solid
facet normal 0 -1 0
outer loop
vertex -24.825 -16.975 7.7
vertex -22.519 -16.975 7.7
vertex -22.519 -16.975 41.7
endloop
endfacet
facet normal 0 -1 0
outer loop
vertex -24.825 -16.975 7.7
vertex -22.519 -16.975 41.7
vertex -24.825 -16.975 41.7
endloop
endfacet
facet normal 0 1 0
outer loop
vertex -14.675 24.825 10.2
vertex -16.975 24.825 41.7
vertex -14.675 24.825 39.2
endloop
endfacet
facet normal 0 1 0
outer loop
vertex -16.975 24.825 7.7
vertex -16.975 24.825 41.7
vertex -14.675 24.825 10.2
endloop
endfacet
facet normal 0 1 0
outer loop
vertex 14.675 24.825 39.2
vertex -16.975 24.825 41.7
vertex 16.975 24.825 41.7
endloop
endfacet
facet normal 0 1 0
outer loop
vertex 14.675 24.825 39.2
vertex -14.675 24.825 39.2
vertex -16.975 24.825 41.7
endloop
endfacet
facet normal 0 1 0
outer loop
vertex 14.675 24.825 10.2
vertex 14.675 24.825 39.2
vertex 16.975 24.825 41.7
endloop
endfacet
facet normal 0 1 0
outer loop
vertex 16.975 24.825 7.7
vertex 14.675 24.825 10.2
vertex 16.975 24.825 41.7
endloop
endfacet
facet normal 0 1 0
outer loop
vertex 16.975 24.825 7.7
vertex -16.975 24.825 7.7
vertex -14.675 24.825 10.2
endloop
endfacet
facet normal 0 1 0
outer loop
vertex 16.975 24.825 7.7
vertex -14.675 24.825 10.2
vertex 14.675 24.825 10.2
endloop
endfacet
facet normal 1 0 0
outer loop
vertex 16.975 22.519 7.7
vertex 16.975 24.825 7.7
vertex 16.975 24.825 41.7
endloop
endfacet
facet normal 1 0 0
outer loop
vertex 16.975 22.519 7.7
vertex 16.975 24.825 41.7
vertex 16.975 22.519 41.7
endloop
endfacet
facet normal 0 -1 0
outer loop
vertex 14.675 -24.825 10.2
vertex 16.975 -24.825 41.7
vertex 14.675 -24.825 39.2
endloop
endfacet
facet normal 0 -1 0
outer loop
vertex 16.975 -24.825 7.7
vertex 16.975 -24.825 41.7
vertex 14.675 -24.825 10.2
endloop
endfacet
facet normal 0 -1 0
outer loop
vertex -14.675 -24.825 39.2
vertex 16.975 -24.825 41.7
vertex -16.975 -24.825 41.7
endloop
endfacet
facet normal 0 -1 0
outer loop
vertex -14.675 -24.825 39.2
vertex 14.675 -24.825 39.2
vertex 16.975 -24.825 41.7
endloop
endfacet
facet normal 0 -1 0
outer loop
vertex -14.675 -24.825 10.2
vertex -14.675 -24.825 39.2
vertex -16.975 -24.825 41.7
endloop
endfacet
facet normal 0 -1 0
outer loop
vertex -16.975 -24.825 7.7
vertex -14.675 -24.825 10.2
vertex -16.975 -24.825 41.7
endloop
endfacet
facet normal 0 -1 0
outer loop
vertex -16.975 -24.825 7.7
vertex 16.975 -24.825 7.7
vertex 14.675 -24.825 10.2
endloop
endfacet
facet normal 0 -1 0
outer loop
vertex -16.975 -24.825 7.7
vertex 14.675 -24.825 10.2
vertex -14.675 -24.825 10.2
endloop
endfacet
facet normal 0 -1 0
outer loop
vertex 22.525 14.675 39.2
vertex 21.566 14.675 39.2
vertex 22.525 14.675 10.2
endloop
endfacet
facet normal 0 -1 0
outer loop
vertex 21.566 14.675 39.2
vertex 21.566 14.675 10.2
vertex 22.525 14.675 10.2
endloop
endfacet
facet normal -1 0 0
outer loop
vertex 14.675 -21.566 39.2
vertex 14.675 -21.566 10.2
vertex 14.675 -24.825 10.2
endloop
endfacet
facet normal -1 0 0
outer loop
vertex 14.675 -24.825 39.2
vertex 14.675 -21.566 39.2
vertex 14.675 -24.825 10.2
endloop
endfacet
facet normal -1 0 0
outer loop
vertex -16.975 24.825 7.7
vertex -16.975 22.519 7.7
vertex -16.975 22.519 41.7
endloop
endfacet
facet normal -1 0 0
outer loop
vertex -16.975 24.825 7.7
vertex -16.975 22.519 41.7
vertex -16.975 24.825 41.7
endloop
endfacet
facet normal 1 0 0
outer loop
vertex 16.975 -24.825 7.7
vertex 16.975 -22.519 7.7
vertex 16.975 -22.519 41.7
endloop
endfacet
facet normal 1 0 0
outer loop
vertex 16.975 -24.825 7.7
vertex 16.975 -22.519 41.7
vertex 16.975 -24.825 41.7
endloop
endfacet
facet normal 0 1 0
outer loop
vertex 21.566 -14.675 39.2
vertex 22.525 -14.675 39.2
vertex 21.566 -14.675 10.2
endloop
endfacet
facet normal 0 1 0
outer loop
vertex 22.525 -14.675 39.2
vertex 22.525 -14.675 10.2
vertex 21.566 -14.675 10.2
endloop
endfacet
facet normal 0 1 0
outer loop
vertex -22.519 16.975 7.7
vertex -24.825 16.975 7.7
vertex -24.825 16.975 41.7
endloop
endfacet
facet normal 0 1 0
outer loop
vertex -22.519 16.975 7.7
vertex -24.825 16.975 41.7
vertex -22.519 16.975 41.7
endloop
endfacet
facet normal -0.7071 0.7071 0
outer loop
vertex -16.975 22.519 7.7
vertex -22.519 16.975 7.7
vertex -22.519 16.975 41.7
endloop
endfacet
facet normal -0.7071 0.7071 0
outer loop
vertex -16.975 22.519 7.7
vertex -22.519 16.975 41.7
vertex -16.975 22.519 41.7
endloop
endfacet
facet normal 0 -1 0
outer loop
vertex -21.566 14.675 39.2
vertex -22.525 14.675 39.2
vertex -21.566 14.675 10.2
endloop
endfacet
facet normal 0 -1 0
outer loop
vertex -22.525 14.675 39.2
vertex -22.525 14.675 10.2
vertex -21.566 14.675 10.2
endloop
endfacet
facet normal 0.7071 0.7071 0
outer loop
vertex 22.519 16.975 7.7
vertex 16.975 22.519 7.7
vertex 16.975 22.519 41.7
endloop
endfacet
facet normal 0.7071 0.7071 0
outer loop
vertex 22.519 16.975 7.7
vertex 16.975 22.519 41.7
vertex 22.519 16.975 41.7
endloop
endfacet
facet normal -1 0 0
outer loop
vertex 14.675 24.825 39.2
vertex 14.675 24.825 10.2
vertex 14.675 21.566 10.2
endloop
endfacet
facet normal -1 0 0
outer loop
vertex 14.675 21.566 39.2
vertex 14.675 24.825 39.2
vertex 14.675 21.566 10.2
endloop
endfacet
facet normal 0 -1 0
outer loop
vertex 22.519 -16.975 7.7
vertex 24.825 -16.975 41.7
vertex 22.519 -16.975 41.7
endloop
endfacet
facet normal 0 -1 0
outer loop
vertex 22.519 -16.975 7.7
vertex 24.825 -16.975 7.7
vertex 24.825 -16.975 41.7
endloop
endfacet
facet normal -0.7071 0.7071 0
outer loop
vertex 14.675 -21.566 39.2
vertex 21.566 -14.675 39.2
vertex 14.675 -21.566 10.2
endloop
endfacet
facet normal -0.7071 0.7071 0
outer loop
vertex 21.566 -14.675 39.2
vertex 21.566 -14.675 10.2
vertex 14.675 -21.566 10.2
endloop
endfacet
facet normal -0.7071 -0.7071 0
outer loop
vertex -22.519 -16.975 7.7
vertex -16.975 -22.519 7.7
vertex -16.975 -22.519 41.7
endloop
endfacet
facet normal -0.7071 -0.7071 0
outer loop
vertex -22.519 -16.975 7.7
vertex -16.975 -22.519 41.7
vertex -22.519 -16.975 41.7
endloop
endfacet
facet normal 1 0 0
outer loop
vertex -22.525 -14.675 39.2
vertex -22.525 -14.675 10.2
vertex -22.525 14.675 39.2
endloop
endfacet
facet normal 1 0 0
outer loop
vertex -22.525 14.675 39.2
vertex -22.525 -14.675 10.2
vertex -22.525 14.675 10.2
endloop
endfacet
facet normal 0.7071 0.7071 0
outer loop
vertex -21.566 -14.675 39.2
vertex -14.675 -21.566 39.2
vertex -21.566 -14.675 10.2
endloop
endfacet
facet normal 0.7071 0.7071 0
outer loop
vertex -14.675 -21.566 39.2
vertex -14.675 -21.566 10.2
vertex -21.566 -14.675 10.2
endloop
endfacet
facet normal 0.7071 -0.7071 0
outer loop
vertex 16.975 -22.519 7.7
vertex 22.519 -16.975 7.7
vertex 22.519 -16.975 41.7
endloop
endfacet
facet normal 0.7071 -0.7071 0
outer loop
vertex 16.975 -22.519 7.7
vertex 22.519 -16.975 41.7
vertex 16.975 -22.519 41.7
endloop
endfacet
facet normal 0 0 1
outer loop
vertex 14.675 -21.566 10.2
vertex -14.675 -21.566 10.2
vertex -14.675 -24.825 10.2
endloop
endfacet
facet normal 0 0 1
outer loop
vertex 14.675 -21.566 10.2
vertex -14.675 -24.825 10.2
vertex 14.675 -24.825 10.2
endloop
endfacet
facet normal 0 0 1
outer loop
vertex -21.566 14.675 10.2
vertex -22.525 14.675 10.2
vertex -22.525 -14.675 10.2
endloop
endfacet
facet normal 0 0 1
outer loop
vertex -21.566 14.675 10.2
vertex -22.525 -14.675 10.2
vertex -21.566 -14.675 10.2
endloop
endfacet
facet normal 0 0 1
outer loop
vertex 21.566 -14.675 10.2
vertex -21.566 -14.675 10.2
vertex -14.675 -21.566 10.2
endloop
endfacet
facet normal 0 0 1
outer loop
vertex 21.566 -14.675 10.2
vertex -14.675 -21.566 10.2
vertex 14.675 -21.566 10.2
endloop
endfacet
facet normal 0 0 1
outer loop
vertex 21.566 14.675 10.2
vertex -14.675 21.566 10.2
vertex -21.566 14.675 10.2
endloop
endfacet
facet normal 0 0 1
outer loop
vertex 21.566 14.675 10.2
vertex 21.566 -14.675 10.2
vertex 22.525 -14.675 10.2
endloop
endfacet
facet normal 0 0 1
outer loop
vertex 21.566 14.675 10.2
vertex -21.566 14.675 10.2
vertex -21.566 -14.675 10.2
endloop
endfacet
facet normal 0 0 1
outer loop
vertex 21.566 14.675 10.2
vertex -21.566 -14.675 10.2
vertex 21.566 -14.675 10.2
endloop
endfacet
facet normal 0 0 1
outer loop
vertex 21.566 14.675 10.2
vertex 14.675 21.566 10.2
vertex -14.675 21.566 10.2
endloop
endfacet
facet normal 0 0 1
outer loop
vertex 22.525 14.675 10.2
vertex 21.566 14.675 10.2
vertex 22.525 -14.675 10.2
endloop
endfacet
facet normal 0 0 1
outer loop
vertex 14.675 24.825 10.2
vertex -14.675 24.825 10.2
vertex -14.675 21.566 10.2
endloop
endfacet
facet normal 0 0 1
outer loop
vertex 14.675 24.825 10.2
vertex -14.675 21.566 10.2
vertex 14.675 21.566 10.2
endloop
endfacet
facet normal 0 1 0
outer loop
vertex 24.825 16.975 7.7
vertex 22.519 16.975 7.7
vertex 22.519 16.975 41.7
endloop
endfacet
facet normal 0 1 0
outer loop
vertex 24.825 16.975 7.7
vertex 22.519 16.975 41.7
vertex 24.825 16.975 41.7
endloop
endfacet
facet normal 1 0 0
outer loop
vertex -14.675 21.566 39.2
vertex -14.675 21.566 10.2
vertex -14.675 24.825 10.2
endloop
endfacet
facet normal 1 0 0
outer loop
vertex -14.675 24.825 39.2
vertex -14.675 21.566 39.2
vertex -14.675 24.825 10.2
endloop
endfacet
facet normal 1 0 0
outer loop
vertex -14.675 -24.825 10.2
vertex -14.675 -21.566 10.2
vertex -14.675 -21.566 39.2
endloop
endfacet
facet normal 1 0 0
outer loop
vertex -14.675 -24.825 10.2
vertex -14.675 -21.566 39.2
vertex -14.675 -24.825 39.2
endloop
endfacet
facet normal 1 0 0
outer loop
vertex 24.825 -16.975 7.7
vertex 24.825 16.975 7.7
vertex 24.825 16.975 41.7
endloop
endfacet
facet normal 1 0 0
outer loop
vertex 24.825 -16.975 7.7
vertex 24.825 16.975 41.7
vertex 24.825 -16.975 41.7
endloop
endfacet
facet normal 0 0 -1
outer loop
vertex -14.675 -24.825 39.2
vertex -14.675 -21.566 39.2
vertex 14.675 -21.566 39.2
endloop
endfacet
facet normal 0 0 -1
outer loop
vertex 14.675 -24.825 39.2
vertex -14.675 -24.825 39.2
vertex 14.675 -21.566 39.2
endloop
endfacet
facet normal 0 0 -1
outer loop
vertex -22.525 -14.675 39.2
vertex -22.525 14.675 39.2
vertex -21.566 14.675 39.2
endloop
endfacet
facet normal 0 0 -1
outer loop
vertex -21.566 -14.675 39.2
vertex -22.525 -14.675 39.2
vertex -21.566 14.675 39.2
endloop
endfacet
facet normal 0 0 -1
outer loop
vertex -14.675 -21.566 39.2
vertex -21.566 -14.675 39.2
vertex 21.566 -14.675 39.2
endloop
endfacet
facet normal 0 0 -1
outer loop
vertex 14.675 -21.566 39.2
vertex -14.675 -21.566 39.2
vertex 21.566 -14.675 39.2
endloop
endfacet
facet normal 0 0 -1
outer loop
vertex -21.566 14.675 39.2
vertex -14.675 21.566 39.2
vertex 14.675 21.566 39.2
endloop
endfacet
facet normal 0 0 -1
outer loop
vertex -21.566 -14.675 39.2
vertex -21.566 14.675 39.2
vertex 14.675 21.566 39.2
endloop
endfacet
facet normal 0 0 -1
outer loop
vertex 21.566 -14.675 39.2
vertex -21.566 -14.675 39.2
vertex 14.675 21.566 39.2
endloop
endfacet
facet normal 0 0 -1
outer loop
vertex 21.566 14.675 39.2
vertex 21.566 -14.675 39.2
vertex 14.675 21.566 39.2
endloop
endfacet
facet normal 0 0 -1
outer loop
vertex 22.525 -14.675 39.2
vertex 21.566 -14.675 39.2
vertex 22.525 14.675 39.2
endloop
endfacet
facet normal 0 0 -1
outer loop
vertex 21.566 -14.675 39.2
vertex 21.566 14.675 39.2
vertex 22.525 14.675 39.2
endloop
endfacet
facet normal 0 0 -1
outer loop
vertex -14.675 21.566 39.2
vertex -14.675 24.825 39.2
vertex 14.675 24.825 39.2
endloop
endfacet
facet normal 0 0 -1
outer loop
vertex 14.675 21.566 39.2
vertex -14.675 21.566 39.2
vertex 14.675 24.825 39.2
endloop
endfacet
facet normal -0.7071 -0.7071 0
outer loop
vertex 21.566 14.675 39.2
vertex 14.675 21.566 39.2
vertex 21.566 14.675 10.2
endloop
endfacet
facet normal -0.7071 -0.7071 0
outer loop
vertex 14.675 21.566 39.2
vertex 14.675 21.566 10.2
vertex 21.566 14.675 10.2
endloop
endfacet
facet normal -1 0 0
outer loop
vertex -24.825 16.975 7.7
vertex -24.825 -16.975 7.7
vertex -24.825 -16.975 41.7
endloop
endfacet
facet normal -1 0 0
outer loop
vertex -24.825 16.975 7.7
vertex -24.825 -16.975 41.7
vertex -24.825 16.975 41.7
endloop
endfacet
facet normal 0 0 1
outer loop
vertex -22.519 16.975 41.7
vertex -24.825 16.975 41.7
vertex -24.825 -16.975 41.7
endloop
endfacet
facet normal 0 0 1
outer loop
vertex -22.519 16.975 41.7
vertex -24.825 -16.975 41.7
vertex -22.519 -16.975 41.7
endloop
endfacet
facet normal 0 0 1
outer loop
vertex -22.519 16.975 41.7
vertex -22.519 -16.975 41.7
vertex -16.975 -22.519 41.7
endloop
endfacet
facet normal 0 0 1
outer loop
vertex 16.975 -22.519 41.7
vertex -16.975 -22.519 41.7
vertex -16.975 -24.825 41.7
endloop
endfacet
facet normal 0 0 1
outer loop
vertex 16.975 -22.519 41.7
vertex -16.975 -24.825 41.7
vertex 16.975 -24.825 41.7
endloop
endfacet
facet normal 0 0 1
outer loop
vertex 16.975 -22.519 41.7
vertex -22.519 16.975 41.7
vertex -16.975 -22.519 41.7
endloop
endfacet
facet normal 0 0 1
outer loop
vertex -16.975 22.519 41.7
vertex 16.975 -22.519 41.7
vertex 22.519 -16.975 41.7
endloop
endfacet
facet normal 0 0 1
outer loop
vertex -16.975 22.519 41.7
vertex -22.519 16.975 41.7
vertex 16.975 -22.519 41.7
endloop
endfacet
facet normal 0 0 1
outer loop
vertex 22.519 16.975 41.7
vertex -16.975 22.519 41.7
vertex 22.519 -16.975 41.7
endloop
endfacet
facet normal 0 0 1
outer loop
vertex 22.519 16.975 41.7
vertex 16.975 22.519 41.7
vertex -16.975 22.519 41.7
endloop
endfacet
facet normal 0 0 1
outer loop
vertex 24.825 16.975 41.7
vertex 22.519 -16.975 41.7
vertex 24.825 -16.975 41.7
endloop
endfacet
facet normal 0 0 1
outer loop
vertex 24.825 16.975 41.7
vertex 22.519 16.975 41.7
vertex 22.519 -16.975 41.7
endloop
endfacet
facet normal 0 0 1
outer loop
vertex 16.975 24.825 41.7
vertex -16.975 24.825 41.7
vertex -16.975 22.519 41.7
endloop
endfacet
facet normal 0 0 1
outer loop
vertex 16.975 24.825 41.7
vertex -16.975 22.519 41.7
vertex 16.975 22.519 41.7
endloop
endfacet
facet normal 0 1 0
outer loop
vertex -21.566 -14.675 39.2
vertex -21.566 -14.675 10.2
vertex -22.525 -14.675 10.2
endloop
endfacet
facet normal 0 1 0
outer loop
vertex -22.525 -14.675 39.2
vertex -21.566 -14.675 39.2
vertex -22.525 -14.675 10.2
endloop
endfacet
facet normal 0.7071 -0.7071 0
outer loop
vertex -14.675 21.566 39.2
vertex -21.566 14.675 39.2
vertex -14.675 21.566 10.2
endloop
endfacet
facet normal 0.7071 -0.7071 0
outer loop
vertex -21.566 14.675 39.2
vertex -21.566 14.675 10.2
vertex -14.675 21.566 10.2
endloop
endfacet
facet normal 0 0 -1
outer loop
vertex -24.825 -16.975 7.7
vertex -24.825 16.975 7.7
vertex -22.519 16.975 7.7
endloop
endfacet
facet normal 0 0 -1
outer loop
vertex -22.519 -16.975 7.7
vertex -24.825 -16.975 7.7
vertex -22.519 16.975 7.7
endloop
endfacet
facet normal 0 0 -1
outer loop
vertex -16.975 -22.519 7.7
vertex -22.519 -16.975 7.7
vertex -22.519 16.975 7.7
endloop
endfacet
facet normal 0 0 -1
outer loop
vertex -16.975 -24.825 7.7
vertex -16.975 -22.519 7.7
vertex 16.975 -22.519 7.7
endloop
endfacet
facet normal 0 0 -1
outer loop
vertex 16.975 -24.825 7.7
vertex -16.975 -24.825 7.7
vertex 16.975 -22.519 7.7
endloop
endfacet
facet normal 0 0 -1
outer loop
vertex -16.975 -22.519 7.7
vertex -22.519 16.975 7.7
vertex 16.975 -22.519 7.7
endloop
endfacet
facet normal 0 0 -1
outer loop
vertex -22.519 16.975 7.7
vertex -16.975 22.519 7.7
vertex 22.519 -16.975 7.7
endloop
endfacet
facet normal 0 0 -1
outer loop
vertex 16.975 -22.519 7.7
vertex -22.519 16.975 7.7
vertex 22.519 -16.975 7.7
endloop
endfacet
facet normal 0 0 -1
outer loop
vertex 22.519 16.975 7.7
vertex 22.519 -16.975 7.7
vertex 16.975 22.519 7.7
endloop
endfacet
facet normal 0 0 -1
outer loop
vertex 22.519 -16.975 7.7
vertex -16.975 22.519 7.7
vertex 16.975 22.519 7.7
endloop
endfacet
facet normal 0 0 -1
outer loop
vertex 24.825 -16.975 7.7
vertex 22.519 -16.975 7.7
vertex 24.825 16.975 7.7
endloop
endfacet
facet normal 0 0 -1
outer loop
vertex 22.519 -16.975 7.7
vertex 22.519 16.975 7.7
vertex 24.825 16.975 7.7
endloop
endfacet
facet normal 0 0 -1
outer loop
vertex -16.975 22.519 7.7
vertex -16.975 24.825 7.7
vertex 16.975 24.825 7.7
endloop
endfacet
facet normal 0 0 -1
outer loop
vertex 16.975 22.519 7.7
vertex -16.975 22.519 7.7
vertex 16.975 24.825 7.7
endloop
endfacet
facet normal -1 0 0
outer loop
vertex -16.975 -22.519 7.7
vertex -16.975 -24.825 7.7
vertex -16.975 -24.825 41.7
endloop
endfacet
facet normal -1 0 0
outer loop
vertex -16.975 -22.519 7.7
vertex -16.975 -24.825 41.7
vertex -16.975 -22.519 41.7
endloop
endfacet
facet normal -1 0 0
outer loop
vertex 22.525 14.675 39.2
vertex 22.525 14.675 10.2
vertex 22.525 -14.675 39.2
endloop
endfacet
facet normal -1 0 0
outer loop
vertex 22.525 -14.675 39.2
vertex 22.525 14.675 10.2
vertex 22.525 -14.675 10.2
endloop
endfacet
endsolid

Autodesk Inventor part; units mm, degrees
ref_plane "YZ Plane" through (0, 0, 0) normal (1, 0, 0) x (0, 1, 0)
ref_plane "XZ Plane" through (0, 0, 0) normal (0, 1, 0) x (-1, 0, 0)
sketch "Sketch1" plane through (0, 0, 0) normal (0, 0, 1) x (1, 0, 0)
  circle A0 centre (-10, 20.9) radius 1.875 projected
  circle A1 centre (-10, -20.9) radius 1.875 projected
  circle A2 centre (10, 20.9) radius 1.875 projected
  circle A3 centre (10, -20.9) radius 1.875 projected
  circle A4 centre (20.8, -14.4) radius 2.075 projected
  circle A5 centre (20.8, 14.4) radius 2.075 projected
  circle A6 centre (-20.8, 14.4) radius 2.075 projected
  circle A7 centre (-20.8, -14.4) radius 2.075 projected
  line L0 (16.9, -16.9) -> (-16.9, -16.9) projected
  line L1 (-16.9, -16.9) -> (-16.9, 16.9) projected
  line L2 (-16.9, 16.9) -> (16.9, 16.9) projected
  line L3 (16.9, 16.9) -> (16.9, -16.9) projected
  line L4 (-17.05, 24.9) -> (-17.05, 22.55) projected
  line L5 (-17.05, 22.55) -> (-22.55, 17.05) projected
  line L6 (-22.55, 17.05) -> (-24.9, 17.05) projected
  line L7 (-24.9, 17.05) -> (-24.9, -17.05) projected
  line L8 (-24.9, -17.05) -> (-22.55, -17.05) projected
  line L9 (-22.55, -17.05) -> (-17.05, -22.55) projected
  line L10 (-17.05, -22.55) -> (-17.05, -24.9) projected
  line L11 (-17.05, -24.9) -> (17.05, -24.9) projected
  line L12 (17.05, -24.9) -> (17.05, -22.55) projected
  line L13 (17.05, -22.55) -> (22.55, -17.05) projected
  line L14 (22.55, -17.05) -> (24.9, -17.05) projected
  line L15 (24.9, -17.05) -> (24.9, 17.05) projected
  line L16 (24.9, 17.05) -> (22.55, 17.05) projected
  line L17 (22.55, 17.05) -> (17.05, 22.55) projected
  line L18 (17.05, 22.55) -> (17.05, 24.9) projected
  line L19 (17.05, 24.9) -> (-17.05, 24.9) projected
  line L20 (24.825, 16.975) -> (24.825, -16.975)
  line L21 (24.825, -16.975) -> (22.5189, -16.975)
  line L22 (22.5189, -16.975) -> (16.975, -22.5189)
  line L23 (16.975, -22.5189) -> (16.975, -24.825)
  line L24 (16.975, -24.825) -> (-16.975, -24.825)
  line L25 (-16.975, -24.825) -> (-16.975, -22.5189)
  line L26 (-16.975, -22.5189) -> (-22.5189, -16.975)
  line L27 (-22.5189, -16.975) -> (-24.825, -16.975)
  line L28 (-24.825, -16.975) -> (-24.825, 16.975)
  line L29 (-24.825, 16.975) -> (-22.5189, 16.975)
  line L30 (-22.5189, 16.975) -> (-16.975, 22.5189)
  line L31 (-16.975, 22.5189) -> (-16.975, 24.825)
  line L32 (-16.975, 24.825) -> (16.975, 24.825)
  line L33 (16.975, 24.825) -> (16.975, 22.5189)
  line L34 (16.975, 22.5189) -> (22.5189, 16.975)
  line L35 (22.5189, 16.975) -> (24.825, 16.975)
  point P0 (0, 0)
  dimension "d0" = 0.075
ref_plane "Work Plane1" through (-24.9, -24.9, 7.7) normal (0, 0, 1) x (1, 0, 0)
extrude "Extrusion1" add sketch "Sketch1" along normal blind 2.5 from surface at 7.7 contours A0 | A1 | A2 | A3 | A4 | A5 | A6 | A7 | L0 L1 L2 L3 | L20 L21 L22 L23 L24 L25 L26 L27 L28 L29 L30 L31 L32 L33 L34 L35
sketch "Sketch2" plane through (0, 0, 0) normal (0, 0, 1) x (1, 0, 0)
  line L0 (22.5189, 16.975) -> (24.825, 16.975) projected
  line L1 (16.975, 22.5189) -> (22.5189, 16.975) projected
  line L2 (16.975, 24.825) -> (16.975, 22.5189) projected
  line L3 (-16.975, 24.825) -> (16.975, 24.825) projected
  line L4 (-16.975, 22.5189) -> (-16.975, 24.825) projected
  line L5 (-22.5189, 16.975) -> (-16.975, 22.5189) projected
  line L6 (-24.825, 16.975) -> (-22.5189, 16.975) projected
  line L7 (-24.825, -16.975) -> (-24.825, 16.975) projected
  line L8 (-22.5189, -16.975) -> (-24.825, -16.975) projected
  line L9 (-16.975, -22.5189) -> (-22.5189, -16.975) projected
  line L10 (-16.975, -24.825) -> (-16.975, -22.5189) projected
  line L11 (16.975, -24.825) -> (-16.975, -24.825) projected
  line L12 (16.975, -22.5189) -> (16.975, -24.825) projected
  line L13 (22.5189, -16.975) -> (16.975, -22.5189) projected
  line L14 (24.825, -16.975) -> (22.5189, -16.975) projected
  line L15 (24.825, 16.975) -> (24.825, -16.975) projected
  line L16 (24.825, -16.975) -> (22.5189, -16.975)
  line L17 (22.5189, -16.975) -> (22.5189, 16.975)
  line L18 (22.5189, 16.975) -> (24.825, 16.975)
  line L19 (24.825, 16.975) -> (24.825, -16.975)
  line L20 (-22.5189, 16.975) -> (-24.825, 16.975)
  line L21 (-24.825, 16.975) -> (-24.825, -16.975)
  line L22 (-24.825, -16.975) -> (-22.5189, -16.975)
  line L23 (-22.5189, -16.975) -> (-22.5189, 16.975)
  line L24 (22.525, -14.675) -> (21.5662, -14.675)
  line L25 (21.5662, -14.675) -> (14.675, -21.5662)
  line L26 (14.675, -21.5662) -> (14.675, -22.525)
  line L27 (14.675, -22.525) -> (-14.675, -22.525)
  line L28 (-14.675, -22.525) -> (-14.675, -21.5662)
  line L29 (-14.675, -21.5662) -> (-21.5662, -14.675)
  line L30 (-21.5662, -14.675) -> (-22.525, -14.675)
  line L31 (-22.525, -14.675) -> (-22.525, 14.675)
  line L32 (-22.525, 14.675) -> (-21.5662, 14.675)
  line L33 (-21.5662, 14.675) -> (-14.675, 21.5662)
  line L34 (-14.675, 21.5662) -> (-14.675, 22.525)
  line L35 (-14.675, 22.525) -> (14.675, 22.525)
  line L36 (14.675, 22.525) -> (14.675, 21.5662)
  line L37 (14.675, 21.5662) -> (21.5662, 14.675)
  line L38 (21.5662, 14.675) -> (22.525, 14.675)
  line L39 (22.525, 14.675) -> (22.525, -14.675)
  line L40 (14.675, 22.525) -> (14.675, 24.825)
  line L41 (-14.675, 22.525) -> (-14.675, 24.825)
  line L42 (-14.675, -22.525) -> (-14.675, -24.825)
  line L43 (14.675, -22.525) -> (14.675, -24.825)
  point P0 (0, 0)
  dimension "d3" = 2.3
extrude "Extrusion2" add sketch "Sketch2" along normal blind 31.5 from surface at 10.2 contours L17 L38 L37 L36 L40 L3 L2 L1 | L0 L15 L14 L17 L24 L39 L38 | L17 L13 L12 L11 L43 L26 L25 L24 | L41 L34 L33 L32 L23 L5 L4 L3 | L42 L11 L10 L9 L23 L30 L29 L28 | L23 L32 L31 L30 L8 L7 L6
extrude "Extrusion3" add sketch "Sketch2" against normal blind 2.5 from surface at 41.7
properties part number "Tunnel Horizontal"
